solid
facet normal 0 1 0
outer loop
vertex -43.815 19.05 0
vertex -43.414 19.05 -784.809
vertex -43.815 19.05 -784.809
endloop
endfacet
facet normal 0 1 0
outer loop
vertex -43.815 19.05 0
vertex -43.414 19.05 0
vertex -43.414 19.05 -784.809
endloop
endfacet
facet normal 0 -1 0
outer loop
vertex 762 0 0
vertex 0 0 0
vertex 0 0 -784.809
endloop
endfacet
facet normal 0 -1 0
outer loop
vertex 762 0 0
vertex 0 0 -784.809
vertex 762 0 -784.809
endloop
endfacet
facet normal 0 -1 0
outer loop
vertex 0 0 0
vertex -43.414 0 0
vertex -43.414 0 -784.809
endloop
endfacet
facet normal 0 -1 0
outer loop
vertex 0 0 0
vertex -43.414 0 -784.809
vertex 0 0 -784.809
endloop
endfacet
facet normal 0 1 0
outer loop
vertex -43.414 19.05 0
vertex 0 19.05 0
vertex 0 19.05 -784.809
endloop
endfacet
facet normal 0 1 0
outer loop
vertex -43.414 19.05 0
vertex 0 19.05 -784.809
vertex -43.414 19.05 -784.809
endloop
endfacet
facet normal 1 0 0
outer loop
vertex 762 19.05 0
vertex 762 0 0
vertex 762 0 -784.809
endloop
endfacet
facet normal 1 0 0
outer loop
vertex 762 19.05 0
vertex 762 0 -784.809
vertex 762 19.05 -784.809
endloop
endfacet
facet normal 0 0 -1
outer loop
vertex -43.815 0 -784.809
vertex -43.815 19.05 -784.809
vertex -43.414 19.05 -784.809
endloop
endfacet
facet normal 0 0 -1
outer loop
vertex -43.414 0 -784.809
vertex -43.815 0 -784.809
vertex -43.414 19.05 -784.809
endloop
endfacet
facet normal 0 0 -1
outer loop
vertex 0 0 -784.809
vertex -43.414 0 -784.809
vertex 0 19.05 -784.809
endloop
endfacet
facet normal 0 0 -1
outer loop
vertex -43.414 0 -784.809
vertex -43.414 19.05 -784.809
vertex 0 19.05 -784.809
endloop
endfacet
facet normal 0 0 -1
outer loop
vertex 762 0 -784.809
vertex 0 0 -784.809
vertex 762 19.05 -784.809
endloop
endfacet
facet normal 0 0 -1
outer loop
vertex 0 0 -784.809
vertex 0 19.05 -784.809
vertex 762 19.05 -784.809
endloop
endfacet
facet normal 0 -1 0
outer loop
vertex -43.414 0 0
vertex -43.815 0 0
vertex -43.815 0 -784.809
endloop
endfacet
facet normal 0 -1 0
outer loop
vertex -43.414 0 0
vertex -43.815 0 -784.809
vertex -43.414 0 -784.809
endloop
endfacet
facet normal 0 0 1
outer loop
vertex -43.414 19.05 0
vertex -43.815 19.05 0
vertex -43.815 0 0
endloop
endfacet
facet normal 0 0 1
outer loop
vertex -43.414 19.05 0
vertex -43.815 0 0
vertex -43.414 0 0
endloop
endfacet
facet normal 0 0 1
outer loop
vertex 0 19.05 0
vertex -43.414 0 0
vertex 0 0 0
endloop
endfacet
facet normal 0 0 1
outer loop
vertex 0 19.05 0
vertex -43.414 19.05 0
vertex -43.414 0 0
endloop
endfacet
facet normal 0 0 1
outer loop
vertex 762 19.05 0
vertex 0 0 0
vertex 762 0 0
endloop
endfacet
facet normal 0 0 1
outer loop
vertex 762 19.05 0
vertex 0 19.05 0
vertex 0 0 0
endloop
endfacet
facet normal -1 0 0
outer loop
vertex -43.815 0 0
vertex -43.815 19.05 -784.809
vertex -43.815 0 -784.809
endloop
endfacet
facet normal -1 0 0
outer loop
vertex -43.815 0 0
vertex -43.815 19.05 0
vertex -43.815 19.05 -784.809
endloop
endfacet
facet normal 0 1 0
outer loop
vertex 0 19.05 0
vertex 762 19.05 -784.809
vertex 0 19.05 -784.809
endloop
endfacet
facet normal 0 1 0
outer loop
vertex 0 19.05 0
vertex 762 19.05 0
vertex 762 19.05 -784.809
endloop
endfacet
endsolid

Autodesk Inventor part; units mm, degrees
ref_plane "YZ Plane" through (0, 0, 0) normal (1, 0, 0) x (0, 1, 0)
ref_plane "XZ Plane" through (0, 0, 0) normal (0, 1, 0) x (-1, 0, 0)
ref_plane "XY Plane" through (0, 0, 0) normal (0, 0, 1) x (1, 0, 0)
sketch "Sketch1" plane through (0, 0, 0) normal (0, 0, 1) x (1, 0, 0)
  line L0 (0, 0) -> (762, 0)
  line L1 (762, 0) -> (762, 19.05)
  line L2 (762, 19.05) -> (0, 19.05)
  line L3 (0, 19.05) -> (-43.4138, 19.05)
  line L4 (-43.4138, 0) -> (0, 0)
  line L5 (-43.815, 19.05) -> (-43.815, 23.2664)
  line L6 (-43.4138, 19.05) -> (-43.815, 19.05)
  line L7 (-43.815, 19.05) -> (-43.815, 0)
  line L8 (-43.815, 0) -> (-43.4138, 0)
  dimension "d0" = 762
  dimension "d1" = 19.05
extrude "Extrusion1" add sketch "Sketch1" against normal blind 784.8092
properties part number "Plywood Base - TBone"
